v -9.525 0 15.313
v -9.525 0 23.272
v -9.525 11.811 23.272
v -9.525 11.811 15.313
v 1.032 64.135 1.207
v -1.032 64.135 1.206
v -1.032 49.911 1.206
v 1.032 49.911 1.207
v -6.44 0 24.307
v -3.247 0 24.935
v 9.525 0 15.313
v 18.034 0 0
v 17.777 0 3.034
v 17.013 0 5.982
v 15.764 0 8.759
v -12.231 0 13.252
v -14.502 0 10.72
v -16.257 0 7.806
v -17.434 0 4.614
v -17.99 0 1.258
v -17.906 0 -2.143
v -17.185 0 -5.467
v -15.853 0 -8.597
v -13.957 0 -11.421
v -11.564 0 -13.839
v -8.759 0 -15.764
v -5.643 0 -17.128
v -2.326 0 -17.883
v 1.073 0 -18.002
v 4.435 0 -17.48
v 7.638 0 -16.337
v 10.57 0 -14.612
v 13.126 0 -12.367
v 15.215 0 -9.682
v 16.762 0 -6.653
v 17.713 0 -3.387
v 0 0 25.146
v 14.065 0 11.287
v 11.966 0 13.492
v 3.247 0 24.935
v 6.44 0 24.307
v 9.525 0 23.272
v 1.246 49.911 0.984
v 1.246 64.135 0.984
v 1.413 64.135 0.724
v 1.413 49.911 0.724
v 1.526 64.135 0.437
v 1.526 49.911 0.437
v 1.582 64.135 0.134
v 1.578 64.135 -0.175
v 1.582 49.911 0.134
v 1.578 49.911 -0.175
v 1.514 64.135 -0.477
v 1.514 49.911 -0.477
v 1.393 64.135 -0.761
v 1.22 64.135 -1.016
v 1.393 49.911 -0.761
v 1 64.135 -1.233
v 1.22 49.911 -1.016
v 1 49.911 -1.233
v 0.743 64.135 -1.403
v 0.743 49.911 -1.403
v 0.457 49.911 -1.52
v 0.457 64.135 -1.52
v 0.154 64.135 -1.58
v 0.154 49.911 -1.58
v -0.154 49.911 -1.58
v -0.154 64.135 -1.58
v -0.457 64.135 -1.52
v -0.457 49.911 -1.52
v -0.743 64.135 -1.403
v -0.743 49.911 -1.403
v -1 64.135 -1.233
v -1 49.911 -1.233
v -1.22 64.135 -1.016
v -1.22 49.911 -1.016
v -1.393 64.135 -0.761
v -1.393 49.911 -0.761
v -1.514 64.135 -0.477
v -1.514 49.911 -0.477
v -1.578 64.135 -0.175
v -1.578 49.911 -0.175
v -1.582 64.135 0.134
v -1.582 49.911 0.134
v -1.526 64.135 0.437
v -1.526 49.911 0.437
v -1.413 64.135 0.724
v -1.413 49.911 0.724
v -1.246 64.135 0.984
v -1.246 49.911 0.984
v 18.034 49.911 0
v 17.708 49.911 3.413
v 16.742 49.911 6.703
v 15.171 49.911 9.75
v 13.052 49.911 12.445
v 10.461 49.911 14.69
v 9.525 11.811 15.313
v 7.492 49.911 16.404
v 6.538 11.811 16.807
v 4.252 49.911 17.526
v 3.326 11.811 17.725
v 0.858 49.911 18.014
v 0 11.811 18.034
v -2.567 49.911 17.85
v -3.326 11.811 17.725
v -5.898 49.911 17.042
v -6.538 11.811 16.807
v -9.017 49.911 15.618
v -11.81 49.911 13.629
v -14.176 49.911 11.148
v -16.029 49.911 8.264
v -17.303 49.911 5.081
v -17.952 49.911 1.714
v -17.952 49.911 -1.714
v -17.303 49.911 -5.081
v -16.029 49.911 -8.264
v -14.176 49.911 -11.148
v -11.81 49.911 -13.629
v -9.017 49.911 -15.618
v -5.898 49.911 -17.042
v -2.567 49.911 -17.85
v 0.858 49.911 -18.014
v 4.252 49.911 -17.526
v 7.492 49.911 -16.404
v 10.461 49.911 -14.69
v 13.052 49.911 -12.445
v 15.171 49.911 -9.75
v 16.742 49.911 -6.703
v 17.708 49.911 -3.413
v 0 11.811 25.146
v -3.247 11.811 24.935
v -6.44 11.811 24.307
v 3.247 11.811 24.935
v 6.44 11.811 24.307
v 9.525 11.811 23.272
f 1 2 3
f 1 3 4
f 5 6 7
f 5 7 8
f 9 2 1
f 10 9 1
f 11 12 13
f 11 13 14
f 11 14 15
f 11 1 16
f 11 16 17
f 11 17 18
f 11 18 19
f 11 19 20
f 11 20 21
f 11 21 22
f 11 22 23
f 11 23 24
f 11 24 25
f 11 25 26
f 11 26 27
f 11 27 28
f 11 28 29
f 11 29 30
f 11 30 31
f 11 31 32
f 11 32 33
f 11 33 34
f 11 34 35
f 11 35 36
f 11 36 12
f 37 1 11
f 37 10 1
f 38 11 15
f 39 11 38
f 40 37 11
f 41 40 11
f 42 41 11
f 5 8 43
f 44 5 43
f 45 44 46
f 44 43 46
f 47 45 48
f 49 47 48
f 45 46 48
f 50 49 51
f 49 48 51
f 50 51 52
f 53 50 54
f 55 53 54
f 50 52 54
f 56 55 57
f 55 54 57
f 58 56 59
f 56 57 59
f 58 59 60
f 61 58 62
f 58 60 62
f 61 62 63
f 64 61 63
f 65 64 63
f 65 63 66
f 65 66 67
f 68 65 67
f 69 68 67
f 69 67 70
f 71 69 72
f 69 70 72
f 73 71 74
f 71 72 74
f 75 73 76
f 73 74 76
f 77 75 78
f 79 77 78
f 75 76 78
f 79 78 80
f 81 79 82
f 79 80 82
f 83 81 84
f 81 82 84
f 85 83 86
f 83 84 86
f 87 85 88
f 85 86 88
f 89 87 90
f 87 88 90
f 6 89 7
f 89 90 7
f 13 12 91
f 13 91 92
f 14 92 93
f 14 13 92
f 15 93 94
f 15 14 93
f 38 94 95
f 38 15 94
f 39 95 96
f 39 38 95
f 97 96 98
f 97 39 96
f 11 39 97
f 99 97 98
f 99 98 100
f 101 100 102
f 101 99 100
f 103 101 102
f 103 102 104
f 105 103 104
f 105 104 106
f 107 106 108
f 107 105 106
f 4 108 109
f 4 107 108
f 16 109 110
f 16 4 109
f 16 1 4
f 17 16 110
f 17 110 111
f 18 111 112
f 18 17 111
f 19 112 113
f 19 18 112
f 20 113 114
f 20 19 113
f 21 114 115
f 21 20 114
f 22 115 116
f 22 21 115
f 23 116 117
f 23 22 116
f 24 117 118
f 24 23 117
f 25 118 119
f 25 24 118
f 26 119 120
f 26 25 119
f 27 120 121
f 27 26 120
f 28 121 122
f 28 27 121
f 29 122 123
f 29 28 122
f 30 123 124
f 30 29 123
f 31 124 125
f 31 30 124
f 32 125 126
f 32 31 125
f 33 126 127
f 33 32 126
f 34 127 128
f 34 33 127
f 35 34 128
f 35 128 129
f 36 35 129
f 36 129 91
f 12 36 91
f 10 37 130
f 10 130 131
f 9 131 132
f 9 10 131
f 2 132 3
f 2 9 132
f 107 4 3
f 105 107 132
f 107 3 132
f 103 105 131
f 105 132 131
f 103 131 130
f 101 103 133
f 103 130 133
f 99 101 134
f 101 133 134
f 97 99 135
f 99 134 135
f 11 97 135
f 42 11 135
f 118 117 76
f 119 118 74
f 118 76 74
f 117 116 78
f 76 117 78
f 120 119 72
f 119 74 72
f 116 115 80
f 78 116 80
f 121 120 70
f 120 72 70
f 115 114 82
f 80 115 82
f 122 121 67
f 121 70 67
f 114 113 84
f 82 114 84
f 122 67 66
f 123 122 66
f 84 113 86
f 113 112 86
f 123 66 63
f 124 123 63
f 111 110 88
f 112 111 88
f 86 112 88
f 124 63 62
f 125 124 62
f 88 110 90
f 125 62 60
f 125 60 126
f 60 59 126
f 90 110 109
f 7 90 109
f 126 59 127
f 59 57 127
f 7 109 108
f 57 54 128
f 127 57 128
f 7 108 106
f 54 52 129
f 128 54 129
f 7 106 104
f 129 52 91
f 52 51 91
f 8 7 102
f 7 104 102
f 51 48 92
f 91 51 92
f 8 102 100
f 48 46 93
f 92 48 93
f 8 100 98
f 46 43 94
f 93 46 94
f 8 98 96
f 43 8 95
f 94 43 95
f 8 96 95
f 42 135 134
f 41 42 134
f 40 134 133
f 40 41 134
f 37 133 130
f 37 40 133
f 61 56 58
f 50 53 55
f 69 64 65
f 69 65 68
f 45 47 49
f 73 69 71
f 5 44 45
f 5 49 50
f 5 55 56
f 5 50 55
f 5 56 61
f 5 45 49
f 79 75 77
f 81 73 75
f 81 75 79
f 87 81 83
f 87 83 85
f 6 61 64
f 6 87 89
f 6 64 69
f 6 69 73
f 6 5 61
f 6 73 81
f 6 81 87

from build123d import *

# Parameters (mm, degrees)
F0_R     = 18.034
F1_DEPTH = 49.911
F3_DEPTH = 11.811
F5_DEPTH = 14.224


with BuildPart() as f1:
    # F0 (on Front) → F1 (new body)
    with BuildSketch(Plane.XZ):
        Circle(F0_R)
    extrude(amount=-F1_DEPTH)

    # F2 (on Front) → F3 (join)
    with BuildSketch(Plane.XZ):
        with BuildLine():
            ThreePointArc((-9.525, 15.3133775177), (0, 18.034), (9.525, 15.3133775177))
            Line((9.525, 15.3133775177), (9.525, 23.2722085544))
            ThreePointArc((9.525, 23.2722085544), (4.8537799544, 24.6731055231), (0, 25.146))
            ThreePointArc((0, 25.146), (-4.8537799544, 24.6731055231), (-9.525, 23.2722085544))
            Line((-9.525, 23.2722085544), (-9.525, 15.3133775177))
        make_face()
    extrude(amount=-F3_DEPTH)

    # F4 (on face) → F5 (join)
    with BuildSketch(Plane(origin=(0, 49.911, 0), x_dir=(-1, 0, 0), z_dir=(0, 1, 0))):
        with BuildLine():
            Line((1.0317528774, 1.2065), (-1.0317528774, 1.2065))
            ThreePointArc((-1.0317528774, 1.2065), (0, -1.5875), (1.0317528774, 1.2065))
        make_face()
    extrude(amount=F5_DEPTH)


solid = f1.part
